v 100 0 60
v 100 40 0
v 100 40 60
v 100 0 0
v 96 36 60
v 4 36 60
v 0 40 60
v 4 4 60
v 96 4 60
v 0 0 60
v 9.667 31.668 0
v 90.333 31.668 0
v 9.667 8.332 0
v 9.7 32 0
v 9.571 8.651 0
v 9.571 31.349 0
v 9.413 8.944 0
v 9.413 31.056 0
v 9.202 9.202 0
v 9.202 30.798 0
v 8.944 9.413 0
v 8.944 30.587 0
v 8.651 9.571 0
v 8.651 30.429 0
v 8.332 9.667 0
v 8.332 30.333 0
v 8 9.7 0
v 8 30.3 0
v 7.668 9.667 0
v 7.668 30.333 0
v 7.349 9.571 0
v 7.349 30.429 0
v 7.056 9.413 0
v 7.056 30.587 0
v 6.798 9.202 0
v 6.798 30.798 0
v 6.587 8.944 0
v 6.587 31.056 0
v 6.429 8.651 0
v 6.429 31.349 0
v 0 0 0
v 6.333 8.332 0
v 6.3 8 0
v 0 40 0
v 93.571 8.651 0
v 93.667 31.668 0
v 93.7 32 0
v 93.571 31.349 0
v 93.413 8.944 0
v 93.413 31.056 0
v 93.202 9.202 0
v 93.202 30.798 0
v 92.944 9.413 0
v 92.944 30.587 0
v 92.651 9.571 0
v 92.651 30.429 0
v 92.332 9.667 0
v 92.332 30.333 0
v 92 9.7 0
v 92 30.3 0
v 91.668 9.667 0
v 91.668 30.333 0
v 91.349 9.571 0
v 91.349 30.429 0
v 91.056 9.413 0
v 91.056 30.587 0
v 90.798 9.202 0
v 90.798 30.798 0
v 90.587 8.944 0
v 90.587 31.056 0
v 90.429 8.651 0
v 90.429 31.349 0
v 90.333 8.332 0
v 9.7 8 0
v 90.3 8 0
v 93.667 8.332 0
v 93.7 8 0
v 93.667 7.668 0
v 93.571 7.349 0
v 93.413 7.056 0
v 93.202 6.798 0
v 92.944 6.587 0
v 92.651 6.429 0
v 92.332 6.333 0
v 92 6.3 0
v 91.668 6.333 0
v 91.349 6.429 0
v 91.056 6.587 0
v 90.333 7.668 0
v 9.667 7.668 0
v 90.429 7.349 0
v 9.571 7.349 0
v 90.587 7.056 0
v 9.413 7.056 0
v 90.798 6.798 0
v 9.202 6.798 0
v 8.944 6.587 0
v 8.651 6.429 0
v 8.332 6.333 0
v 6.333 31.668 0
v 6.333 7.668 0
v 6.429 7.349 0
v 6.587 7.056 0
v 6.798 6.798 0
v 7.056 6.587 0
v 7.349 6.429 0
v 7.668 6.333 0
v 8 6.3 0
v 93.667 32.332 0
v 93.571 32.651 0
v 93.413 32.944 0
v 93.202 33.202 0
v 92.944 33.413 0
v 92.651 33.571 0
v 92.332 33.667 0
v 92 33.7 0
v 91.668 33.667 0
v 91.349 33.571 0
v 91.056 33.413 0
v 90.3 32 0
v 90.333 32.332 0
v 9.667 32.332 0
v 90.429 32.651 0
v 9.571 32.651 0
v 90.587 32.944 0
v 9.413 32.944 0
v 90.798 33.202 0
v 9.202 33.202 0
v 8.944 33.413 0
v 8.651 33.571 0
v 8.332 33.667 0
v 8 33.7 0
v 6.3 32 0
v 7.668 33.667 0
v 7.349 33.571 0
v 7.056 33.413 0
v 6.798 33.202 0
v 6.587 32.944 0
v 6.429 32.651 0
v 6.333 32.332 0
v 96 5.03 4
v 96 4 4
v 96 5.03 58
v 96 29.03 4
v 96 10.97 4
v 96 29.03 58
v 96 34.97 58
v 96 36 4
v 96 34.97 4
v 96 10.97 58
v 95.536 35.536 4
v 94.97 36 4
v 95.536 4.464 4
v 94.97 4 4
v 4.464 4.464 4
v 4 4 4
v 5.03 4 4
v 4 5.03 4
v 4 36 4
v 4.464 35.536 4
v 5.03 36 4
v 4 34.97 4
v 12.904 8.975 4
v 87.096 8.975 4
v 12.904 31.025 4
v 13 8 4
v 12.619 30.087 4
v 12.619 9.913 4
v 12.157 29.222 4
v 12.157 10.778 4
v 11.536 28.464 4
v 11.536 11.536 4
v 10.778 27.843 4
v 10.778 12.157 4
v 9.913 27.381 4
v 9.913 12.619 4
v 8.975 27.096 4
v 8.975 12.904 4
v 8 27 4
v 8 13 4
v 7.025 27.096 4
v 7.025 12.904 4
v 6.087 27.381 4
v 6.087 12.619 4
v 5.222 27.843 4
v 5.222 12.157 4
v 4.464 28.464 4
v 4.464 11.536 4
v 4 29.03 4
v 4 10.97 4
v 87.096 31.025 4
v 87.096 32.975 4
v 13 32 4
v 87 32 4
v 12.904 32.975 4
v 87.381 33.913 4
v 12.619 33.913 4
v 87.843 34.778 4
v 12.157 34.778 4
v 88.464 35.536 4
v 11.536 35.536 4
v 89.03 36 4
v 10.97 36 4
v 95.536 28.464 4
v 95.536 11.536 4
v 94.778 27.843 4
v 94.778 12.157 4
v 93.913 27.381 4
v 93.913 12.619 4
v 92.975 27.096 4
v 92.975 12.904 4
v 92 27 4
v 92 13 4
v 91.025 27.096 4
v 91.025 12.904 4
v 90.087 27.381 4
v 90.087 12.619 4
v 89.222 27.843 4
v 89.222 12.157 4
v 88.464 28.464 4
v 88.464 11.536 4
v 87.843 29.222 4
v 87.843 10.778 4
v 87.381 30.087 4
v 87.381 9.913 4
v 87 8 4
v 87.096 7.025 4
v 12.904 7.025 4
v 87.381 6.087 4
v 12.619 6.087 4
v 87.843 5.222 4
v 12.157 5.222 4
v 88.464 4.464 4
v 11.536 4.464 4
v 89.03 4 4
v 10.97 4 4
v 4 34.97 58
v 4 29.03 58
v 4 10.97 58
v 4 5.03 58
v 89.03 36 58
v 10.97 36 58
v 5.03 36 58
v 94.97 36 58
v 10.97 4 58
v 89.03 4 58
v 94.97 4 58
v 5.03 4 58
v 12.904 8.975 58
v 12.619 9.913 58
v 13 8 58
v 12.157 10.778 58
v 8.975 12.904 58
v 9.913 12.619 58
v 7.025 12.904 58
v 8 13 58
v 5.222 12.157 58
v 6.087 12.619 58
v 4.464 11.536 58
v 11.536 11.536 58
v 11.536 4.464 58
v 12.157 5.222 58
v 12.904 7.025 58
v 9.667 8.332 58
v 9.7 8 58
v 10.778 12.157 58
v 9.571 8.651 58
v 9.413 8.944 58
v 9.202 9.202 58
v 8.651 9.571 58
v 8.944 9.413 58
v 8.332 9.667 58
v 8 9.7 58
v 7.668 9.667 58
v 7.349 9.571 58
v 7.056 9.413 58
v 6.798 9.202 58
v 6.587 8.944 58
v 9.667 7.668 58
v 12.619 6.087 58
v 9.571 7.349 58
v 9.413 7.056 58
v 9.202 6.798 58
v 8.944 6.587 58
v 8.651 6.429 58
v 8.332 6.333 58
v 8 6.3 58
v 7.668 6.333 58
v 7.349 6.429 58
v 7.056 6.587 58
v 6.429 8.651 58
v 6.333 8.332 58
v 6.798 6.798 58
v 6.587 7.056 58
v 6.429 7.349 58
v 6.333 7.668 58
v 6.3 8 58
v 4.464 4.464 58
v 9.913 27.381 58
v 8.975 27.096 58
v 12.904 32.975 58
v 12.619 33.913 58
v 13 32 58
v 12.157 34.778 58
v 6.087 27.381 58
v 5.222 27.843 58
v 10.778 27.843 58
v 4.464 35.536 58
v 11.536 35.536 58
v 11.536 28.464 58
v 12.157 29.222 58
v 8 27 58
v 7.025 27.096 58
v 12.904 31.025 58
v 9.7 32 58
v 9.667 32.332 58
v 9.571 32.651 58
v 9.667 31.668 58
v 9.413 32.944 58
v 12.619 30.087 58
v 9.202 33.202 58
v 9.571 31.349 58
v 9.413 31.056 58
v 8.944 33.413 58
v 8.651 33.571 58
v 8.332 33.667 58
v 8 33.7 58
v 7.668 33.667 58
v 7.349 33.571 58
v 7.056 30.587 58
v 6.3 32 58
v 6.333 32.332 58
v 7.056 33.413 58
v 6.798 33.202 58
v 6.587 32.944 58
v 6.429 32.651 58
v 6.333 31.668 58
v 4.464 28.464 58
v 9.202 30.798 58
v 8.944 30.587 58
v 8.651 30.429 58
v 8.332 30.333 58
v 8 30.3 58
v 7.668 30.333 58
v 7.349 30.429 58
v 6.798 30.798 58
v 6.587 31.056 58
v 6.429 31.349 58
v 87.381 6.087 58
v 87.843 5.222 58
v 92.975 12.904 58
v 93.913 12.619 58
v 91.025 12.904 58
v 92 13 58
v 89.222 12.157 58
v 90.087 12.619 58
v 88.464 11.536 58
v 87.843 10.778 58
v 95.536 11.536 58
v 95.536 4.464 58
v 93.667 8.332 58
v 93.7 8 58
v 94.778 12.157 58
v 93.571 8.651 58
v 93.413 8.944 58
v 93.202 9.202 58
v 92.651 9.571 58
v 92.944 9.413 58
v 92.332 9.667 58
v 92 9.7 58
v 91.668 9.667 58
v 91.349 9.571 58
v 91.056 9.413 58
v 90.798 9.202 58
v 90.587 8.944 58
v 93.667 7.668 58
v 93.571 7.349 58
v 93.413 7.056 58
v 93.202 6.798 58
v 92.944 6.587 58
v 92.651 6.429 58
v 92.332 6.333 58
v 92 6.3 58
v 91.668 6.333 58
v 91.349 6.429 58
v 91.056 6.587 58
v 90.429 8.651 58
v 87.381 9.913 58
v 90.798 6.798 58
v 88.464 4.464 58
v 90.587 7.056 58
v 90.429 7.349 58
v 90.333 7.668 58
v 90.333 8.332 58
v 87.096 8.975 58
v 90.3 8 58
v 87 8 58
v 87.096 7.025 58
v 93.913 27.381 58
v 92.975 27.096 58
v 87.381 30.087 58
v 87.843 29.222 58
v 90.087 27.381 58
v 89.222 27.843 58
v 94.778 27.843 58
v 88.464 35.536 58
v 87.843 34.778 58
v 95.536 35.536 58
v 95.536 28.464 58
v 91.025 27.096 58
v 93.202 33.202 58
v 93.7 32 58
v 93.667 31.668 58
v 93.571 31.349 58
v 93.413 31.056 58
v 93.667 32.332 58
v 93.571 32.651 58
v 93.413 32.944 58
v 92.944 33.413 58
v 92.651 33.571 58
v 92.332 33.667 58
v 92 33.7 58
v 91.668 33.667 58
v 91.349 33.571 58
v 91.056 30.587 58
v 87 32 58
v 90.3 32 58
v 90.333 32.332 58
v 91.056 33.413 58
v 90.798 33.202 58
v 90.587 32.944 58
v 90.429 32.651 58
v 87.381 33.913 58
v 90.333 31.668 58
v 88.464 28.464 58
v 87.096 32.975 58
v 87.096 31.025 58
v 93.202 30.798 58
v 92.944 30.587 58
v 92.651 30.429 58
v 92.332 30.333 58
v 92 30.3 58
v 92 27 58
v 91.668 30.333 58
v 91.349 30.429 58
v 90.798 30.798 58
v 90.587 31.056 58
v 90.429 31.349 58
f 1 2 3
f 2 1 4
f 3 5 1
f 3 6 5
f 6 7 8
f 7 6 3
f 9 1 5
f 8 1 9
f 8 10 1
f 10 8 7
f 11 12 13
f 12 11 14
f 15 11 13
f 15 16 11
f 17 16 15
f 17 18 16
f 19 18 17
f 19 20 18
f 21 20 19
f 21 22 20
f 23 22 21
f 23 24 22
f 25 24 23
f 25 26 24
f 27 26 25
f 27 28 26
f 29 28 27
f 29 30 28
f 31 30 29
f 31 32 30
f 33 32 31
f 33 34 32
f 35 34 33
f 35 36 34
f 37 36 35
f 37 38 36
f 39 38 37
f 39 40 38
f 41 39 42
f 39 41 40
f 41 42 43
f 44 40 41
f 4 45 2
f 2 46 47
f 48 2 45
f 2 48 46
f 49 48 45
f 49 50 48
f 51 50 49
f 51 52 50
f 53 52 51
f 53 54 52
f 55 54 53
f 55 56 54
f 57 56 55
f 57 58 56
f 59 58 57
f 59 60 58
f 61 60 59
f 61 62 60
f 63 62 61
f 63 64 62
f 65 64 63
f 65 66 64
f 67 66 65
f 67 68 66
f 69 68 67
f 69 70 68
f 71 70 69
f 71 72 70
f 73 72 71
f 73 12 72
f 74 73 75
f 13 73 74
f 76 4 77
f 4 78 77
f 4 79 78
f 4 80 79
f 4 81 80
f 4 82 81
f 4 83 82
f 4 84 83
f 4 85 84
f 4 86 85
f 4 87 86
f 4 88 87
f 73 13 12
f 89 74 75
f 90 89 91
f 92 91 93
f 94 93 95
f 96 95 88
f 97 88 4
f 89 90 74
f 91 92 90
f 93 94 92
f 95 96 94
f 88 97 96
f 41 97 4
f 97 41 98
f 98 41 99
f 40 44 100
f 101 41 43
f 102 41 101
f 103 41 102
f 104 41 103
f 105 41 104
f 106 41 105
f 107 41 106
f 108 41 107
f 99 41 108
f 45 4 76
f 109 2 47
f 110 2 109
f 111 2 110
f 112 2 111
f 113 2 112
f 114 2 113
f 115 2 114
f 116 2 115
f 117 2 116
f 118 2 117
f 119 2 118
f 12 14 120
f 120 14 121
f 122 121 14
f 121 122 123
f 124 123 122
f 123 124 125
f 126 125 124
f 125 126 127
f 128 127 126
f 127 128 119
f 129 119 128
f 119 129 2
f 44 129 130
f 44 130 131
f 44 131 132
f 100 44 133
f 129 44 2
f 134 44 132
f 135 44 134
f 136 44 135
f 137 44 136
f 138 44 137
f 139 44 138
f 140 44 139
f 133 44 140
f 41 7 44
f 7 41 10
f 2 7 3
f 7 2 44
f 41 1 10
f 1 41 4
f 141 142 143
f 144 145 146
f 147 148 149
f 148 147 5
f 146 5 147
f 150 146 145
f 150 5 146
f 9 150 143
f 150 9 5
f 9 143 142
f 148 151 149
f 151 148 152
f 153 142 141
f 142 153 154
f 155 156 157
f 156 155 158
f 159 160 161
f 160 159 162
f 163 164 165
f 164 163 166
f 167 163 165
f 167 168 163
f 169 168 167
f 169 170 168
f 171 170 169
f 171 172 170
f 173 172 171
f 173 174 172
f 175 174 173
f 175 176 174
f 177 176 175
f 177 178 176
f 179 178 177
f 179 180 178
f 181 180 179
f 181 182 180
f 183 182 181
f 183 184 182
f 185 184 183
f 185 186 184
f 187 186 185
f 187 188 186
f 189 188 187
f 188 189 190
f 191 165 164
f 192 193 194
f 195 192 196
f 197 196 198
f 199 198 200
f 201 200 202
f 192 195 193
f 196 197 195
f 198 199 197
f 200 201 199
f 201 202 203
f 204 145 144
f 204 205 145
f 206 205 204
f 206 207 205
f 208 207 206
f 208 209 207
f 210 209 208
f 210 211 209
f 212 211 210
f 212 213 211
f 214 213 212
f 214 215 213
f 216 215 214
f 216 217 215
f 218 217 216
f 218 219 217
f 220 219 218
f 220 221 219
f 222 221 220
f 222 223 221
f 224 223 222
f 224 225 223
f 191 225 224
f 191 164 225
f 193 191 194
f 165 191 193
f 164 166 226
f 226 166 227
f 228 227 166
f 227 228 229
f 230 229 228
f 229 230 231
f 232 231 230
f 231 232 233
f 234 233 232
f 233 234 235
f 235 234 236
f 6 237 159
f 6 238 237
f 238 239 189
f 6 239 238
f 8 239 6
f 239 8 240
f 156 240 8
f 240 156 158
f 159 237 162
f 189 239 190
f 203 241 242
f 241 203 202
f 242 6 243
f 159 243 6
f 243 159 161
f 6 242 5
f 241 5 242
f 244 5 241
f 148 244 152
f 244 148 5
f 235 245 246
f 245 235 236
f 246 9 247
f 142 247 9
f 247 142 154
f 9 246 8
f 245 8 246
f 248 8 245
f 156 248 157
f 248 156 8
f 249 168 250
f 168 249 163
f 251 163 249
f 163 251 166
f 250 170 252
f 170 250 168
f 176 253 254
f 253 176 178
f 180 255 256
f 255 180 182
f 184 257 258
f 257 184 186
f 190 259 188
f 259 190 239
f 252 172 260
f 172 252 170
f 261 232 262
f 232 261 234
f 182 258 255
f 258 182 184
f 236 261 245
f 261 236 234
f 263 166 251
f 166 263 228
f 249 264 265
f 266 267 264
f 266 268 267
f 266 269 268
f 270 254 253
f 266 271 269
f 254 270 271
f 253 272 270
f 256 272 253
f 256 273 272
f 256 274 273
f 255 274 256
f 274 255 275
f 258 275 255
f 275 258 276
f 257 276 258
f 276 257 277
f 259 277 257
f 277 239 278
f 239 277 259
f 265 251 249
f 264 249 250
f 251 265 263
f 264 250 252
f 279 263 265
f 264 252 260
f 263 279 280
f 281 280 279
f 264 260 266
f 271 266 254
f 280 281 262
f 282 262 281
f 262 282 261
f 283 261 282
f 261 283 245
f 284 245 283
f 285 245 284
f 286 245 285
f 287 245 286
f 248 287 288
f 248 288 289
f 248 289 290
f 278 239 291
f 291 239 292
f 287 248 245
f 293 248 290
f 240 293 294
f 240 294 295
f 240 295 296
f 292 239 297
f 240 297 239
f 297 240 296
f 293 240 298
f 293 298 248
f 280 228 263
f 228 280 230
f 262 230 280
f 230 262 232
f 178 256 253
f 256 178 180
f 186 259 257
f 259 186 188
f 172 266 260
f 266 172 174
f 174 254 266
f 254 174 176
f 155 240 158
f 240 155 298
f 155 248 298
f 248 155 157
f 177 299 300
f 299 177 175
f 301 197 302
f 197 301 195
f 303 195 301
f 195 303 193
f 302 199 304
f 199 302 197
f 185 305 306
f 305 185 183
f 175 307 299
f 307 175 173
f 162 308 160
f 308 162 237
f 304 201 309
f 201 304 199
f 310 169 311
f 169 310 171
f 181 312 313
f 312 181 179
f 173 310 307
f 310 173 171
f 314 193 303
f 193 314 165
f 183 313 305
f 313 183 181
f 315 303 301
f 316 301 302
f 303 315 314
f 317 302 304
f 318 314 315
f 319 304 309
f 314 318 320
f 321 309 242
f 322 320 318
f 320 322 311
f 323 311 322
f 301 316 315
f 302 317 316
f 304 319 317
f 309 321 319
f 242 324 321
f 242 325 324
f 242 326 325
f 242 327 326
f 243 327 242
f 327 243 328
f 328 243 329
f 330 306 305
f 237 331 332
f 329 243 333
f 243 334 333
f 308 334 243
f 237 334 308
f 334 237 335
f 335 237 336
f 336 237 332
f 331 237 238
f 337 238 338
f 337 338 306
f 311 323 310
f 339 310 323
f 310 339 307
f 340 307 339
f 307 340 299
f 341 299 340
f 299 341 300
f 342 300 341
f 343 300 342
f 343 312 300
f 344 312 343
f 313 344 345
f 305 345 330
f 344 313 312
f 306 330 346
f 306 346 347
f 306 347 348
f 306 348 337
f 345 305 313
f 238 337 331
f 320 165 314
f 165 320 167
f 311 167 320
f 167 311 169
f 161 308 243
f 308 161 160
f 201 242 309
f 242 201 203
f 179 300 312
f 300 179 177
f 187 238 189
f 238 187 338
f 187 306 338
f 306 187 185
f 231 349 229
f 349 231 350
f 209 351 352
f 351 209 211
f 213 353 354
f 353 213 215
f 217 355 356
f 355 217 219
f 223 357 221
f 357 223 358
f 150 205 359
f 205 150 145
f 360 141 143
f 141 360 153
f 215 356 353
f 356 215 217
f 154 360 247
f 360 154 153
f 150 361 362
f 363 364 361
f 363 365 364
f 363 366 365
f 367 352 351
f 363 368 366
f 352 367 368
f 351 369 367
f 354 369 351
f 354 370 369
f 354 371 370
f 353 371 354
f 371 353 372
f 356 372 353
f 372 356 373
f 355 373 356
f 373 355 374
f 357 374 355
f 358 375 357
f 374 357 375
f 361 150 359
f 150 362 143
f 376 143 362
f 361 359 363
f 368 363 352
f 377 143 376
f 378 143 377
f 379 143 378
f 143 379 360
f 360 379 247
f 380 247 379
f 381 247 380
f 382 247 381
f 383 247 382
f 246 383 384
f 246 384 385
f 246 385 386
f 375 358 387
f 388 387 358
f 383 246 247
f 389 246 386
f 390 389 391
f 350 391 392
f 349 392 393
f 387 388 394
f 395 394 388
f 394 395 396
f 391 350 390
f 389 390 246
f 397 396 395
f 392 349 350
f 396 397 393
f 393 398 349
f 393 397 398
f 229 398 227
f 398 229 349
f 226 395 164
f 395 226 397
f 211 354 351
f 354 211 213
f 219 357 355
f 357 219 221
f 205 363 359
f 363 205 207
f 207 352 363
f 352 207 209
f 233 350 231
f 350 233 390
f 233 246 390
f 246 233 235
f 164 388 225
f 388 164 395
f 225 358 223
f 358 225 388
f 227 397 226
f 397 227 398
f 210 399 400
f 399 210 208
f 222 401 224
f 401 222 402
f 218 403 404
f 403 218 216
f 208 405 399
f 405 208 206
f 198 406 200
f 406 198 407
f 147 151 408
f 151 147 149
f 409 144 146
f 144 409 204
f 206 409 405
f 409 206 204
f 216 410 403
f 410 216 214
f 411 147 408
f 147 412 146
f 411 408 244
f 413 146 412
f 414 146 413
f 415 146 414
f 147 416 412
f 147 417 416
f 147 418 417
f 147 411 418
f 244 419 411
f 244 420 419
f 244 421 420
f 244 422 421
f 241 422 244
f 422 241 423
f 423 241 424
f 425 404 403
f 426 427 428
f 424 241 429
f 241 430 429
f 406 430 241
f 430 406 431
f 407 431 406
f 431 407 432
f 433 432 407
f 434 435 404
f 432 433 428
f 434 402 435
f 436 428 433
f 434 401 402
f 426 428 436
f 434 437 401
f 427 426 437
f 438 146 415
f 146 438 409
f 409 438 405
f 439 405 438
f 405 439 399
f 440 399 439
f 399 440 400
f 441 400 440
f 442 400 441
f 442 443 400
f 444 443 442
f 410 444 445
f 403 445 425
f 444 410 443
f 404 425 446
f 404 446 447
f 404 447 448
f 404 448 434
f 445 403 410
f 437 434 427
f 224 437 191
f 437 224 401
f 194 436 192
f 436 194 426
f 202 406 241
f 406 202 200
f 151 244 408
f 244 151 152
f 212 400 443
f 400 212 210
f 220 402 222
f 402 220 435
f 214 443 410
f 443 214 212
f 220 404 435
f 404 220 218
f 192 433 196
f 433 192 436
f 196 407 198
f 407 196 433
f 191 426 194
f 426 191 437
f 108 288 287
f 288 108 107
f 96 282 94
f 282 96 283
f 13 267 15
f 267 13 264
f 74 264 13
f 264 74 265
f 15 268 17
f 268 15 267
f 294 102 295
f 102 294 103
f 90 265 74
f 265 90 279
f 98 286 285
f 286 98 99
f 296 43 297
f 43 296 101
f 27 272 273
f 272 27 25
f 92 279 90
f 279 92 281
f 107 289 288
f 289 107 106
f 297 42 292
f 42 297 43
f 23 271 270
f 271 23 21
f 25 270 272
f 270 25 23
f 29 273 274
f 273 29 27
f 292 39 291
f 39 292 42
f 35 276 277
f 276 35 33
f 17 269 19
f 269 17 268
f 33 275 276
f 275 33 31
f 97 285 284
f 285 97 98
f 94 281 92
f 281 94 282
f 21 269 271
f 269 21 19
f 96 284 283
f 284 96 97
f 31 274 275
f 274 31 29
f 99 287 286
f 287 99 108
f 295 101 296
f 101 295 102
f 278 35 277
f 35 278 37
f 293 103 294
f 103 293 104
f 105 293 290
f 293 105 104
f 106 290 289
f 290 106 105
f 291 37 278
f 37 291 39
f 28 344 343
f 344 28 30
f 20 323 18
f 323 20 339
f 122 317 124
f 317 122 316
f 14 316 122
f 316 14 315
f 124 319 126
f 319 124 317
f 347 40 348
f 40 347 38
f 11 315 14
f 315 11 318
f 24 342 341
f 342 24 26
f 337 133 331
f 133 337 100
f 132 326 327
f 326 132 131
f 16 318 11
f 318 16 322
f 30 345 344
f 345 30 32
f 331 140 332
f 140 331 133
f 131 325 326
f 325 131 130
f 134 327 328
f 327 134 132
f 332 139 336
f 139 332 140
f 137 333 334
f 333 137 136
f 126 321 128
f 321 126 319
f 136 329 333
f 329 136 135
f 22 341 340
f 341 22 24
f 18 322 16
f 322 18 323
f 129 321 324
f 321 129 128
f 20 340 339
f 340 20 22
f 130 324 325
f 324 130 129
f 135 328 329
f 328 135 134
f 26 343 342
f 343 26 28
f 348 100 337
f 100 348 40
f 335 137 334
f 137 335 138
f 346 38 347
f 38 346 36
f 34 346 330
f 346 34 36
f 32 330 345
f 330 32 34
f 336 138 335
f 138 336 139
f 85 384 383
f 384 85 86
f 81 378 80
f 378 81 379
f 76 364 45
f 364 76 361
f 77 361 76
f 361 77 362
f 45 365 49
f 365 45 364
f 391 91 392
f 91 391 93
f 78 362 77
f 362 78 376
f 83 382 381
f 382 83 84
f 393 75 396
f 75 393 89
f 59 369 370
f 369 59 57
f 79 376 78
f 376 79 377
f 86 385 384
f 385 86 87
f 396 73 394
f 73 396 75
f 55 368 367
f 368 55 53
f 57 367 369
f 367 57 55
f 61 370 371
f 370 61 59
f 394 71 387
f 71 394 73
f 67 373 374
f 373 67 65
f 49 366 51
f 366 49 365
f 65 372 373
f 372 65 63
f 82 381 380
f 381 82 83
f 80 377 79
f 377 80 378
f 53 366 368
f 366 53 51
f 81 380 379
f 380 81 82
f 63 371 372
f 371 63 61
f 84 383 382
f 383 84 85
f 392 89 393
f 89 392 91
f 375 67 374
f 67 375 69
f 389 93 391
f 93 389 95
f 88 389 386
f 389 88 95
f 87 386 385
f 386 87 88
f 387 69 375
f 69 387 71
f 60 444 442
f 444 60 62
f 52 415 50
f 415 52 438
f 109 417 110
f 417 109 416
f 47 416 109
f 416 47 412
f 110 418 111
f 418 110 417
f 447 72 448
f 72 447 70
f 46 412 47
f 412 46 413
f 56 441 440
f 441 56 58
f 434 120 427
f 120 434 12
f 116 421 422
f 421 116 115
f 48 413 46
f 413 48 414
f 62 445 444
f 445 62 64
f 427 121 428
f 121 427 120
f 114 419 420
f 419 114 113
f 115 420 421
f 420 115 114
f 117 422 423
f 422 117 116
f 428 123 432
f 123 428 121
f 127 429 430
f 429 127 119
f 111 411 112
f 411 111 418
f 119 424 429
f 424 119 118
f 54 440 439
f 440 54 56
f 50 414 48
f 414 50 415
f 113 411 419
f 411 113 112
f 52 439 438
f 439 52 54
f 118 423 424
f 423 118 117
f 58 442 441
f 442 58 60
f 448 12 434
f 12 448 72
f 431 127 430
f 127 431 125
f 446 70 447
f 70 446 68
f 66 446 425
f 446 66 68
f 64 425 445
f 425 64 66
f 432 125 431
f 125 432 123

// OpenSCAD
$fn = 32;

// ----------------------------------------------------------------------
// Enclosure body: 100 x 40 x 60 mm, wall 4 mm
// ----------------------------------------------------------------------

// --- parameters (mm) ---
length = 100;             // outside length, X
width = 40;               // outside width, Y
height = 60;              // outside height, Z
wall = 4;                 // side wall thickness
floor_t = 4;              // floor thickness
boss_d = 10;              // corner boss diameter
boss_h = 54;              // corner boss height above the floor
boss_hole_d = 3.4;        // lid screw clearance in the boss
boss_lip = 8;             // boss centre inset from the corner

module shell() {
  difference() {
    cube([length, width, height]);
    /* hollow, open at the top */
    translate([wall, wall, floor_t])
      cube([length - 2 * wall, width - 2 * wall, height]);
  }
}

module bosses() {
  /* corner bosses, sunk 1 mm into the floor */
  for (sx = [0, 1]) for (sy = [0, 1])
    translate([sx * (length - 2 * boss_lip) + boss_lip, sy * (width - 2 * boss_lip) + boss_lip, floor_t - 1])
      cylinder(h = boss_h + 1, d = boss_d);
}

difference() {
  union() {
    shell();
    bosses();
  }
  /* boss screw holes */
  for (sx = [0, 1]) for (sy = [0, 1])
    translate([sx * (length - 2 * boss_lip) + boss_lip, sy * (width - 2 * boss_lip) + boss_lip, -1]) cylinder(h = floor_t + boss_h + 2, d = boss_hole_d);
}
